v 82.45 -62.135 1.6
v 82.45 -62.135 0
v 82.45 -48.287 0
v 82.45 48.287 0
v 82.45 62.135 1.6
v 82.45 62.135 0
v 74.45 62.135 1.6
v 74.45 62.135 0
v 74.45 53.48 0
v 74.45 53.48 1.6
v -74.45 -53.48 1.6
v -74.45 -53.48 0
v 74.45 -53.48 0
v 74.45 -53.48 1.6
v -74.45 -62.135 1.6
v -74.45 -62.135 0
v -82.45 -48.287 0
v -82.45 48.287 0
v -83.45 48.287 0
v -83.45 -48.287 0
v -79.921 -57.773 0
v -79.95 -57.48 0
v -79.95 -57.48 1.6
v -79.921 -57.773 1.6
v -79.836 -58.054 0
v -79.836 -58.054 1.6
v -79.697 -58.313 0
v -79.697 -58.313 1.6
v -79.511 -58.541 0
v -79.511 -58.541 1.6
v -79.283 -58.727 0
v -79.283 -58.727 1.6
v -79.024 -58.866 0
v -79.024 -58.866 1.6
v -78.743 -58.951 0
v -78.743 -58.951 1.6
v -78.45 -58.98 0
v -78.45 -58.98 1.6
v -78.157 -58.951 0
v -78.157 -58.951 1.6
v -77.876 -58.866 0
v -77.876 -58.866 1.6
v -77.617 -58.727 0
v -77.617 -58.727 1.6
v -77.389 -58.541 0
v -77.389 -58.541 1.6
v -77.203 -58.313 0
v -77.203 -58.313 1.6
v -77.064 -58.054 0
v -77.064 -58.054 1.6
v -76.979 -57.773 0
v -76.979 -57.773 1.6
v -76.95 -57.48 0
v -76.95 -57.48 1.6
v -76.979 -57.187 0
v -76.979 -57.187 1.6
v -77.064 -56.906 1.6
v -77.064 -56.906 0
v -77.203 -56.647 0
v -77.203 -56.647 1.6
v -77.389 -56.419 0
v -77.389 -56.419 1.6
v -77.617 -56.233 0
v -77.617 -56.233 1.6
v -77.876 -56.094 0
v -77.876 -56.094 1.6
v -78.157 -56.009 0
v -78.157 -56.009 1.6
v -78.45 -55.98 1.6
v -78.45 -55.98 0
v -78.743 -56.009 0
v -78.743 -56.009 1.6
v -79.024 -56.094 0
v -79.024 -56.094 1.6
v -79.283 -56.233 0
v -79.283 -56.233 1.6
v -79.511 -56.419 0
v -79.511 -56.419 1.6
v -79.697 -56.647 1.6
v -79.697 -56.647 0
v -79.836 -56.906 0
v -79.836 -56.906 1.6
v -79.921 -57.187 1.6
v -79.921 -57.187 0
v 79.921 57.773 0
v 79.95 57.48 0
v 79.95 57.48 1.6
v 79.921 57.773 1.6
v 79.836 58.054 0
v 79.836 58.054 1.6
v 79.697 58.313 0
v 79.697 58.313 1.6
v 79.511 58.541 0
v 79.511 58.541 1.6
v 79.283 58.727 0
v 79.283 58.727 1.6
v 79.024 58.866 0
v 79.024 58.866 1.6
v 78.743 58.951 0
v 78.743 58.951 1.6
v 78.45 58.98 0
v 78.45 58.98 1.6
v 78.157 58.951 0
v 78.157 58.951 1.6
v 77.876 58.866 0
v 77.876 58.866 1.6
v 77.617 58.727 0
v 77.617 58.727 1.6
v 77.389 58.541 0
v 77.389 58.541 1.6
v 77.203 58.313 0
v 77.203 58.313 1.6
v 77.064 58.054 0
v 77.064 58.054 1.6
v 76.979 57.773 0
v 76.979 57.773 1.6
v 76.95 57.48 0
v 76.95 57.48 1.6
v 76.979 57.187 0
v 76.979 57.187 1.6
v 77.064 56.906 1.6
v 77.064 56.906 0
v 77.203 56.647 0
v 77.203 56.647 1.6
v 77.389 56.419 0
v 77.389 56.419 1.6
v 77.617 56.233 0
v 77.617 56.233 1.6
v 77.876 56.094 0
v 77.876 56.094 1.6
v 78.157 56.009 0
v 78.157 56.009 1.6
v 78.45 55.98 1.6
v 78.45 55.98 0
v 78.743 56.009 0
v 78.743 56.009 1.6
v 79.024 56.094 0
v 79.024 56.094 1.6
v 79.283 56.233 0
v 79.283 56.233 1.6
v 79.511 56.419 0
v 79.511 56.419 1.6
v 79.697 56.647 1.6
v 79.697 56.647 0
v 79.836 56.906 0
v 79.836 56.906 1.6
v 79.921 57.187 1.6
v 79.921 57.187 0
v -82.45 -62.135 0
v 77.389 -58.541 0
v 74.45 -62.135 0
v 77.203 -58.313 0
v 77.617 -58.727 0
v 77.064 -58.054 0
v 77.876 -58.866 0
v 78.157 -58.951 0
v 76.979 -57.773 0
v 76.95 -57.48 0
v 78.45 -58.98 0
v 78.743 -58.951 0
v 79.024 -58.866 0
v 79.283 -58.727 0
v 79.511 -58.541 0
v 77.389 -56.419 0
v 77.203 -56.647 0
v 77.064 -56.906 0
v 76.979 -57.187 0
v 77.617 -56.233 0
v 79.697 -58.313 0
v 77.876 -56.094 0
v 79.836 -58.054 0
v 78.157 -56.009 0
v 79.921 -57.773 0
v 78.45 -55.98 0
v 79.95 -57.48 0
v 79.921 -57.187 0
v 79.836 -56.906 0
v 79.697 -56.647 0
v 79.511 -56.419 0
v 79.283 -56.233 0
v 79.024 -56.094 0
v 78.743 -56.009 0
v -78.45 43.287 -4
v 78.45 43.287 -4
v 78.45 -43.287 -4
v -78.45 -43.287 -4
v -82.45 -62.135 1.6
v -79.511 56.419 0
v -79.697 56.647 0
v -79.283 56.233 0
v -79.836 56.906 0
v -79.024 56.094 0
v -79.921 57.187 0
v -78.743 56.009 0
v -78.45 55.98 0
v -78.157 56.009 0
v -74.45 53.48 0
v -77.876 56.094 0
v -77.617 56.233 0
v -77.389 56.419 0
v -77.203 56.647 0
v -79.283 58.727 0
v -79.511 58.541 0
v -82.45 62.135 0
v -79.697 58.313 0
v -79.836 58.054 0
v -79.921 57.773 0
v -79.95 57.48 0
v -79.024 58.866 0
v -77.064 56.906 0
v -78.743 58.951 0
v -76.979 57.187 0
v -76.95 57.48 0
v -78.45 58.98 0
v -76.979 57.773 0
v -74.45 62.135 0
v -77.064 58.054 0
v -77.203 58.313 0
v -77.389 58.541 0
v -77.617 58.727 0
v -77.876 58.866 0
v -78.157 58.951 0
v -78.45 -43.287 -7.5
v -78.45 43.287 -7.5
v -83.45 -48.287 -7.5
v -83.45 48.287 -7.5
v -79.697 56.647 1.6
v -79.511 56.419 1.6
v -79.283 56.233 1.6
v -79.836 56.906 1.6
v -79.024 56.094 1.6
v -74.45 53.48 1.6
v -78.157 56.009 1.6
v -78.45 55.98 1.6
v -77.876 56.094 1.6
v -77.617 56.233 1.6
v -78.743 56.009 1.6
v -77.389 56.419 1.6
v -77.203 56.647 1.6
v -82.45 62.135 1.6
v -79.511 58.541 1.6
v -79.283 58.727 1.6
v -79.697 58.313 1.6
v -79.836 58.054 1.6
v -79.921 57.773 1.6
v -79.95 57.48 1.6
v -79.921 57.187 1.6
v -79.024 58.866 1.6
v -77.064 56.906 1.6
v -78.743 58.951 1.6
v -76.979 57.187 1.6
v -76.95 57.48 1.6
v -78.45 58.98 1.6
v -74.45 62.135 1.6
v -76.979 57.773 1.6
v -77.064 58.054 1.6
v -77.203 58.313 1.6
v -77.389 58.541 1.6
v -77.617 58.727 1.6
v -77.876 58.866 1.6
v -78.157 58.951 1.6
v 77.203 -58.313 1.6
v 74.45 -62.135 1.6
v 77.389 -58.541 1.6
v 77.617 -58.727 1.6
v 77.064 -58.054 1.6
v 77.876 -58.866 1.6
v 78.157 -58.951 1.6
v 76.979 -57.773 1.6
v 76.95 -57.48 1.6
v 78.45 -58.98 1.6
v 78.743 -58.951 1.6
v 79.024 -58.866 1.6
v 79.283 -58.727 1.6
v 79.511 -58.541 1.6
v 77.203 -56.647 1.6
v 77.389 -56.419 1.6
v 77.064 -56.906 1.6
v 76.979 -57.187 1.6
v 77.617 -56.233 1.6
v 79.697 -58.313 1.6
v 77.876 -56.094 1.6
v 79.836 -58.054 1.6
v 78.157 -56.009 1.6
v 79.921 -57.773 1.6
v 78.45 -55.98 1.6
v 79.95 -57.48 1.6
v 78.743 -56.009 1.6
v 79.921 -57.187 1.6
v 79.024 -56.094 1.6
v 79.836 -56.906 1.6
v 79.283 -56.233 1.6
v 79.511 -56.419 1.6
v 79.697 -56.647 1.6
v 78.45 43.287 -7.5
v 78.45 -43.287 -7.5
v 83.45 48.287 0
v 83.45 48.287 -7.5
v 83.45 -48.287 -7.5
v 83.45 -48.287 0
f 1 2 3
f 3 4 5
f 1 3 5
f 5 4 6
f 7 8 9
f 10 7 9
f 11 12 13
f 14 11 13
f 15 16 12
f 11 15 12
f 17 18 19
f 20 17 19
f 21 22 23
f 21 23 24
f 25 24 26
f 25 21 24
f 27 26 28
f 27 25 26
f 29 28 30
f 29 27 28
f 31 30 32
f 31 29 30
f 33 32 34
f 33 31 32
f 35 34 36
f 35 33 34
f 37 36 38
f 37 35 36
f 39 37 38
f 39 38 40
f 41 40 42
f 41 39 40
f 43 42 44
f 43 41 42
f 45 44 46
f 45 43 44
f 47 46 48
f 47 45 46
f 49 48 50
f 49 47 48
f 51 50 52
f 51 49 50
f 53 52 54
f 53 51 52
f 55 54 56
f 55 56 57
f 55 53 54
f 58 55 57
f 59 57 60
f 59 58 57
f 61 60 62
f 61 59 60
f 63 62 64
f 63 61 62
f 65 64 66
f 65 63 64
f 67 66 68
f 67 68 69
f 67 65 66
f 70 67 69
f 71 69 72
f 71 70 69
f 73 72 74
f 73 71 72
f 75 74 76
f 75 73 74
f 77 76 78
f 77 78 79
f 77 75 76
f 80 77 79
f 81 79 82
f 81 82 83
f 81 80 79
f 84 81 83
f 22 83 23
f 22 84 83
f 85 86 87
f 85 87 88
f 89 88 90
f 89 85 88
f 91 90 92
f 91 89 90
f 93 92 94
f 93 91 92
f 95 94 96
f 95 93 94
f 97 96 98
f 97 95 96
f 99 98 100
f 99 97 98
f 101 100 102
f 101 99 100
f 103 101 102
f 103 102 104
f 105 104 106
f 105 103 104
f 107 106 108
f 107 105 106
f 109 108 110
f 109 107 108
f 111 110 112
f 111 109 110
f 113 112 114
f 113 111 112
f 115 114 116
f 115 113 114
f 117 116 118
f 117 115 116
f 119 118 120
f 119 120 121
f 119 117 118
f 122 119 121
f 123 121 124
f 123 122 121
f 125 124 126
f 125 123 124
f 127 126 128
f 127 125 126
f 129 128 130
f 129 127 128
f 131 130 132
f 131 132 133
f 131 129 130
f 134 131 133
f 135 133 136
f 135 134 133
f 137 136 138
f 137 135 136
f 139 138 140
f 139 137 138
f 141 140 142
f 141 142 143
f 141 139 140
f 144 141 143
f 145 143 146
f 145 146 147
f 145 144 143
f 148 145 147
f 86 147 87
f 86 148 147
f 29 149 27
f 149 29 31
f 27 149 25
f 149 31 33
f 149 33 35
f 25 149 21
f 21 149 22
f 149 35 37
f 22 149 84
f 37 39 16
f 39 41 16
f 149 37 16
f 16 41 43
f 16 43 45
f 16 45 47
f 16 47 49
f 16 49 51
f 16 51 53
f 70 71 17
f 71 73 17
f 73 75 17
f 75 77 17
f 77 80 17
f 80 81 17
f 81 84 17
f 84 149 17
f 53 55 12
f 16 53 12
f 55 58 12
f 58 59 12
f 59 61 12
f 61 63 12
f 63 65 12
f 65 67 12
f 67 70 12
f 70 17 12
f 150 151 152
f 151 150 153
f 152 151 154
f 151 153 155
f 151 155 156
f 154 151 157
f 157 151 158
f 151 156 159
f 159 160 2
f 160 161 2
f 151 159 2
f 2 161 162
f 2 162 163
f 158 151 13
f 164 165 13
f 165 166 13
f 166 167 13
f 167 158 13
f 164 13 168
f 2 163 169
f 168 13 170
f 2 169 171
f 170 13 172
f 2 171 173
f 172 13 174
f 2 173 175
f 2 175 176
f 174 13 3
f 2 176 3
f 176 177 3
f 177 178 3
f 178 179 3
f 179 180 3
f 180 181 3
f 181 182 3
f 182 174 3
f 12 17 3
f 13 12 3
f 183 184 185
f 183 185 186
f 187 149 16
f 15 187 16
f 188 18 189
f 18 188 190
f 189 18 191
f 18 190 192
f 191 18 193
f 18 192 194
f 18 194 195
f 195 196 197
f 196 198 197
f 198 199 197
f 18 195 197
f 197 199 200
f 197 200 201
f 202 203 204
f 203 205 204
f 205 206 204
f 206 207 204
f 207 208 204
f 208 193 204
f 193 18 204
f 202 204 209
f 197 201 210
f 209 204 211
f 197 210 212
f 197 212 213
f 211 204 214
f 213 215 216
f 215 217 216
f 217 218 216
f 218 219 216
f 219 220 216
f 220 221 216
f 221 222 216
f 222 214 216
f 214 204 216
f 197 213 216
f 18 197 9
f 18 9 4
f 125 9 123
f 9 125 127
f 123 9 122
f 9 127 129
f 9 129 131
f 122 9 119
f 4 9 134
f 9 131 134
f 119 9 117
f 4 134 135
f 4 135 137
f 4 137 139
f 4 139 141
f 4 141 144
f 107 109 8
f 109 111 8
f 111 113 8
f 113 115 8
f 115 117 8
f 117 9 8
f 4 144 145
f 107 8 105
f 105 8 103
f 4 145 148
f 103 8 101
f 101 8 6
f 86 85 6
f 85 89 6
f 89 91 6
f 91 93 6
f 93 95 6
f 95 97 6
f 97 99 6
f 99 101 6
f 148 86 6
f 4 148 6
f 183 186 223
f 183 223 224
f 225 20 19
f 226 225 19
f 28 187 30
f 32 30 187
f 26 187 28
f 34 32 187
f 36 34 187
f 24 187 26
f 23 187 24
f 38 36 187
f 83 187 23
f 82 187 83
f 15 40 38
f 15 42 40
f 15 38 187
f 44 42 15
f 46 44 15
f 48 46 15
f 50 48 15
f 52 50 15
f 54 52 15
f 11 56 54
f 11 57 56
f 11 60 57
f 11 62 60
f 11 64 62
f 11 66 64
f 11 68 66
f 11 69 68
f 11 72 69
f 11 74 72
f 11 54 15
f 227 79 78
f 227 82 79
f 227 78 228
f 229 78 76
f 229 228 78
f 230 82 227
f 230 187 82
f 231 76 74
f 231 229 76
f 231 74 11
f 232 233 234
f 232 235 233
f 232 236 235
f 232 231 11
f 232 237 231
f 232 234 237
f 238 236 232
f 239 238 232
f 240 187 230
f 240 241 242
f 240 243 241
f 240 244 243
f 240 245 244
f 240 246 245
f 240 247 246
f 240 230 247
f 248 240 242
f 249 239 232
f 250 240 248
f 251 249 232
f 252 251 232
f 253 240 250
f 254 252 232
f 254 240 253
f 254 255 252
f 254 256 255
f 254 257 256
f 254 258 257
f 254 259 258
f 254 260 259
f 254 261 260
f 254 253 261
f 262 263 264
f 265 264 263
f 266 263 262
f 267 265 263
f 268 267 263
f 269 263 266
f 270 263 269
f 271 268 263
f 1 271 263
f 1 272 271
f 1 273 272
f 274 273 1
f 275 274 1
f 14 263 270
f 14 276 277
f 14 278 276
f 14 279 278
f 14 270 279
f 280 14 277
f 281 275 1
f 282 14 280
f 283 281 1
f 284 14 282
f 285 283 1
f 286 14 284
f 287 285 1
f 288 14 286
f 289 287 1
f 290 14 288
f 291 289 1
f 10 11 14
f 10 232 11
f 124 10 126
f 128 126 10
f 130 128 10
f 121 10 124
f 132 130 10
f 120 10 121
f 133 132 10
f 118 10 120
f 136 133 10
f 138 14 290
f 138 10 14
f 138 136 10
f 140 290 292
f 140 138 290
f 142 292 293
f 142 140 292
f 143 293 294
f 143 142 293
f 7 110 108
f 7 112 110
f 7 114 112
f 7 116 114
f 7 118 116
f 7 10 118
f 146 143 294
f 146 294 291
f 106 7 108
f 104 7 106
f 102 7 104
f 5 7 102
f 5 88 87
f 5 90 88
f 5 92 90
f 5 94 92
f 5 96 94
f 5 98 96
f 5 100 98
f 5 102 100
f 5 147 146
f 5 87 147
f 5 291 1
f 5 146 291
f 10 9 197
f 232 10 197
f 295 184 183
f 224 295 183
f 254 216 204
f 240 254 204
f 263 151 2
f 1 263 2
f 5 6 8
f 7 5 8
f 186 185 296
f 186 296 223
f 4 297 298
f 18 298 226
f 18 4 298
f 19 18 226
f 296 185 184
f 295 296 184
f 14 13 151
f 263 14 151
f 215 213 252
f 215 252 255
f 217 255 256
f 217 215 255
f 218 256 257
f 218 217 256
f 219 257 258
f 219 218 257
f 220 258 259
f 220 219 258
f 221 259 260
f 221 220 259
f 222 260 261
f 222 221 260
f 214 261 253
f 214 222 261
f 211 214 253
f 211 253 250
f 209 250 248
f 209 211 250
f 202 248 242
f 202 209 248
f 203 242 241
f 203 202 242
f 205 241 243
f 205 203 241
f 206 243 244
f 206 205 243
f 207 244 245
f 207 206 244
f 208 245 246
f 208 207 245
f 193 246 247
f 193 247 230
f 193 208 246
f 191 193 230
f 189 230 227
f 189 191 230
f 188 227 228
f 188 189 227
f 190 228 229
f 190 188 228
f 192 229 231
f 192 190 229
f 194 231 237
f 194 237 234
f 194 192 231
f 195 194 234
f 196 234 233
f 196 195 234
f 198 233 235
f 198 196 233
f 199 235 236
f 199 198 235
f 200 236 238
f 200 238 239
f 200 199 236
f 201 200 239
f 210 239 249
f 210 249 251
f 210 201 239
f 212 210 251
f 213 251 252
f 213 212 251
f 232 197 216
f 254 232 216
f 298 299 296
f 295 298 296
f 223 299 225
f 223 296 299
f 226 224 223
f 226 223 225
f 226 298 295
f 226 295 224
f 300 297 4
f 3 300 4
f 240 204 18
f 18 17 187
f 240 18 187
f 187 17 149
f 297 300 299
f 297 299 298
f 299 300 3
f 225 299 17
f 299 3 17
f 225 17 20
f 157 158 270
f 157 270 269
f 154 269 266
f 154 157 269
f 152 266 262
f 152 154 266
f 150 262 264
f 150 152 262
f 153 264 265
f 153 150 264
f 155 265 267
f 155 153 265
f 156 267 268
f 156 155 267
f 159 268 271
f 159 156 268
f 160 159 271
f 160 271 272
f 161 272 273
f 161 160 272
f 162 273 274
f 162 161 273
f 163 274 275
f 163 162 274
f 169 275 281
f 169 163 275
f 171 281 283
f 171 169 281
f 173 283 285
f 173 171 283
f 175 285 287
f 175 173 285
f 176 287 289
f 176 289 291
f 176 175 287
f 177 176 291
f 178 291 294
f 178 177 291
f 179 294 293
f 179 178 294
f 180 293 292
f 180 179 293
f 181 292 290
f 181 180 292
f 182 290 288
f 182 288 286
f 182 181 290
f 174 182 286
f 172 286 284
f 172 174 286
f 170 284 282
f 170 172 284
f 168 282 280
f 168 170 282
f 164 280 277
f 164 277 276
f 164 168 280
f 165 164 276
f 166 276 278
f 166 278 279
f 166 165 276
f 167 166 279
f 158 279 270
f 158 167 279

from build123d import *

# Parameters (mm, degrees)
SKETCH1_R           = 1.5
BOSS_EXTRUDE1_DEPTH = 1.6
SKETCH2_W           = 166.9
SKETCH2_H           = 96.573841314
SKETCH2_W_2         = 156.9
SKETCH2_H_2         = 86.573841314
BOSS_EXTRUDE2_DEPTH = 7.5
SKETCH3_W           = 156.9
SKETCH3_H           = 86.573841314
BOSS_EXTRUDE3_DEPTH = 4


with BuildPart() as part:
    # Sketch1 → Boss-Extrude1 (new body)
    with BuildSketch(Plane.XY):
        Polygon((-74.45, -53.48), (74.45, -53.48), (74.45, -62.135), (82.45, -62.135), (82.45, -53.48), (82.45, 53.48), (82.45, 62.135), (74.45, 62.135), (74.45, 53.48), (-74.45, 53.48), (-74.45, 62.135), (-82.45, 62.135), (-82.45, 53.48), (-82.45, -53.48), (-82.45, -62.135), (-74.45, -62.135), align=None)
        with Locations((78.45, 57.48)):
            Circle(SKETCH1_R, mode=Mode.SUBTRACT)
        with Locations((-78.45, 57.48)):
            Circle(SKETCH1_R, mode=Mode.SUBTRACT)
        with Locations(Location((-78.45, -57.48, 0), (0, 0, 180))):
            Circle(SKETCH1_R, mode=Mode.SUBTRACT)
        with Locations(Location((78.45, -57.48, 0), (0, 0, 180))):
            Circle(SKETCH1_R, mode=Mode.SUBTRACT)
    extrude(amount=BOSS_EXTRUDE1_DEPTH)

    # Sketch2 → Boss-Extrude2 (add)
    with BuildSketch(Plane(origin=(0, 0, 0), x_dir=(-1, 0, 0), z_dir=(0, 0, -1))):
        Rectangle(SKETCH2_W, SKETCH2_H)
        Rectangle(SKETCH2_W_2, SKETCH2_H_2, mode=Mode.SUBTRACT)
    extrude(amount=BOSS_EXTRUDE2_DEPTH)

    # Sketch3 → Boss-Extrude3 (add)
    with BuildSketch(Plane(origin=(0, 0, 0), x_dir=(-1, 0, 0), z_dir=(0, 0, -1))):
        Rectangle(SKETCH3_W, SKETCH3_H)
    extrude(amount=BOSS_EXTRUDE3_DEPTH)


solid = part.part
